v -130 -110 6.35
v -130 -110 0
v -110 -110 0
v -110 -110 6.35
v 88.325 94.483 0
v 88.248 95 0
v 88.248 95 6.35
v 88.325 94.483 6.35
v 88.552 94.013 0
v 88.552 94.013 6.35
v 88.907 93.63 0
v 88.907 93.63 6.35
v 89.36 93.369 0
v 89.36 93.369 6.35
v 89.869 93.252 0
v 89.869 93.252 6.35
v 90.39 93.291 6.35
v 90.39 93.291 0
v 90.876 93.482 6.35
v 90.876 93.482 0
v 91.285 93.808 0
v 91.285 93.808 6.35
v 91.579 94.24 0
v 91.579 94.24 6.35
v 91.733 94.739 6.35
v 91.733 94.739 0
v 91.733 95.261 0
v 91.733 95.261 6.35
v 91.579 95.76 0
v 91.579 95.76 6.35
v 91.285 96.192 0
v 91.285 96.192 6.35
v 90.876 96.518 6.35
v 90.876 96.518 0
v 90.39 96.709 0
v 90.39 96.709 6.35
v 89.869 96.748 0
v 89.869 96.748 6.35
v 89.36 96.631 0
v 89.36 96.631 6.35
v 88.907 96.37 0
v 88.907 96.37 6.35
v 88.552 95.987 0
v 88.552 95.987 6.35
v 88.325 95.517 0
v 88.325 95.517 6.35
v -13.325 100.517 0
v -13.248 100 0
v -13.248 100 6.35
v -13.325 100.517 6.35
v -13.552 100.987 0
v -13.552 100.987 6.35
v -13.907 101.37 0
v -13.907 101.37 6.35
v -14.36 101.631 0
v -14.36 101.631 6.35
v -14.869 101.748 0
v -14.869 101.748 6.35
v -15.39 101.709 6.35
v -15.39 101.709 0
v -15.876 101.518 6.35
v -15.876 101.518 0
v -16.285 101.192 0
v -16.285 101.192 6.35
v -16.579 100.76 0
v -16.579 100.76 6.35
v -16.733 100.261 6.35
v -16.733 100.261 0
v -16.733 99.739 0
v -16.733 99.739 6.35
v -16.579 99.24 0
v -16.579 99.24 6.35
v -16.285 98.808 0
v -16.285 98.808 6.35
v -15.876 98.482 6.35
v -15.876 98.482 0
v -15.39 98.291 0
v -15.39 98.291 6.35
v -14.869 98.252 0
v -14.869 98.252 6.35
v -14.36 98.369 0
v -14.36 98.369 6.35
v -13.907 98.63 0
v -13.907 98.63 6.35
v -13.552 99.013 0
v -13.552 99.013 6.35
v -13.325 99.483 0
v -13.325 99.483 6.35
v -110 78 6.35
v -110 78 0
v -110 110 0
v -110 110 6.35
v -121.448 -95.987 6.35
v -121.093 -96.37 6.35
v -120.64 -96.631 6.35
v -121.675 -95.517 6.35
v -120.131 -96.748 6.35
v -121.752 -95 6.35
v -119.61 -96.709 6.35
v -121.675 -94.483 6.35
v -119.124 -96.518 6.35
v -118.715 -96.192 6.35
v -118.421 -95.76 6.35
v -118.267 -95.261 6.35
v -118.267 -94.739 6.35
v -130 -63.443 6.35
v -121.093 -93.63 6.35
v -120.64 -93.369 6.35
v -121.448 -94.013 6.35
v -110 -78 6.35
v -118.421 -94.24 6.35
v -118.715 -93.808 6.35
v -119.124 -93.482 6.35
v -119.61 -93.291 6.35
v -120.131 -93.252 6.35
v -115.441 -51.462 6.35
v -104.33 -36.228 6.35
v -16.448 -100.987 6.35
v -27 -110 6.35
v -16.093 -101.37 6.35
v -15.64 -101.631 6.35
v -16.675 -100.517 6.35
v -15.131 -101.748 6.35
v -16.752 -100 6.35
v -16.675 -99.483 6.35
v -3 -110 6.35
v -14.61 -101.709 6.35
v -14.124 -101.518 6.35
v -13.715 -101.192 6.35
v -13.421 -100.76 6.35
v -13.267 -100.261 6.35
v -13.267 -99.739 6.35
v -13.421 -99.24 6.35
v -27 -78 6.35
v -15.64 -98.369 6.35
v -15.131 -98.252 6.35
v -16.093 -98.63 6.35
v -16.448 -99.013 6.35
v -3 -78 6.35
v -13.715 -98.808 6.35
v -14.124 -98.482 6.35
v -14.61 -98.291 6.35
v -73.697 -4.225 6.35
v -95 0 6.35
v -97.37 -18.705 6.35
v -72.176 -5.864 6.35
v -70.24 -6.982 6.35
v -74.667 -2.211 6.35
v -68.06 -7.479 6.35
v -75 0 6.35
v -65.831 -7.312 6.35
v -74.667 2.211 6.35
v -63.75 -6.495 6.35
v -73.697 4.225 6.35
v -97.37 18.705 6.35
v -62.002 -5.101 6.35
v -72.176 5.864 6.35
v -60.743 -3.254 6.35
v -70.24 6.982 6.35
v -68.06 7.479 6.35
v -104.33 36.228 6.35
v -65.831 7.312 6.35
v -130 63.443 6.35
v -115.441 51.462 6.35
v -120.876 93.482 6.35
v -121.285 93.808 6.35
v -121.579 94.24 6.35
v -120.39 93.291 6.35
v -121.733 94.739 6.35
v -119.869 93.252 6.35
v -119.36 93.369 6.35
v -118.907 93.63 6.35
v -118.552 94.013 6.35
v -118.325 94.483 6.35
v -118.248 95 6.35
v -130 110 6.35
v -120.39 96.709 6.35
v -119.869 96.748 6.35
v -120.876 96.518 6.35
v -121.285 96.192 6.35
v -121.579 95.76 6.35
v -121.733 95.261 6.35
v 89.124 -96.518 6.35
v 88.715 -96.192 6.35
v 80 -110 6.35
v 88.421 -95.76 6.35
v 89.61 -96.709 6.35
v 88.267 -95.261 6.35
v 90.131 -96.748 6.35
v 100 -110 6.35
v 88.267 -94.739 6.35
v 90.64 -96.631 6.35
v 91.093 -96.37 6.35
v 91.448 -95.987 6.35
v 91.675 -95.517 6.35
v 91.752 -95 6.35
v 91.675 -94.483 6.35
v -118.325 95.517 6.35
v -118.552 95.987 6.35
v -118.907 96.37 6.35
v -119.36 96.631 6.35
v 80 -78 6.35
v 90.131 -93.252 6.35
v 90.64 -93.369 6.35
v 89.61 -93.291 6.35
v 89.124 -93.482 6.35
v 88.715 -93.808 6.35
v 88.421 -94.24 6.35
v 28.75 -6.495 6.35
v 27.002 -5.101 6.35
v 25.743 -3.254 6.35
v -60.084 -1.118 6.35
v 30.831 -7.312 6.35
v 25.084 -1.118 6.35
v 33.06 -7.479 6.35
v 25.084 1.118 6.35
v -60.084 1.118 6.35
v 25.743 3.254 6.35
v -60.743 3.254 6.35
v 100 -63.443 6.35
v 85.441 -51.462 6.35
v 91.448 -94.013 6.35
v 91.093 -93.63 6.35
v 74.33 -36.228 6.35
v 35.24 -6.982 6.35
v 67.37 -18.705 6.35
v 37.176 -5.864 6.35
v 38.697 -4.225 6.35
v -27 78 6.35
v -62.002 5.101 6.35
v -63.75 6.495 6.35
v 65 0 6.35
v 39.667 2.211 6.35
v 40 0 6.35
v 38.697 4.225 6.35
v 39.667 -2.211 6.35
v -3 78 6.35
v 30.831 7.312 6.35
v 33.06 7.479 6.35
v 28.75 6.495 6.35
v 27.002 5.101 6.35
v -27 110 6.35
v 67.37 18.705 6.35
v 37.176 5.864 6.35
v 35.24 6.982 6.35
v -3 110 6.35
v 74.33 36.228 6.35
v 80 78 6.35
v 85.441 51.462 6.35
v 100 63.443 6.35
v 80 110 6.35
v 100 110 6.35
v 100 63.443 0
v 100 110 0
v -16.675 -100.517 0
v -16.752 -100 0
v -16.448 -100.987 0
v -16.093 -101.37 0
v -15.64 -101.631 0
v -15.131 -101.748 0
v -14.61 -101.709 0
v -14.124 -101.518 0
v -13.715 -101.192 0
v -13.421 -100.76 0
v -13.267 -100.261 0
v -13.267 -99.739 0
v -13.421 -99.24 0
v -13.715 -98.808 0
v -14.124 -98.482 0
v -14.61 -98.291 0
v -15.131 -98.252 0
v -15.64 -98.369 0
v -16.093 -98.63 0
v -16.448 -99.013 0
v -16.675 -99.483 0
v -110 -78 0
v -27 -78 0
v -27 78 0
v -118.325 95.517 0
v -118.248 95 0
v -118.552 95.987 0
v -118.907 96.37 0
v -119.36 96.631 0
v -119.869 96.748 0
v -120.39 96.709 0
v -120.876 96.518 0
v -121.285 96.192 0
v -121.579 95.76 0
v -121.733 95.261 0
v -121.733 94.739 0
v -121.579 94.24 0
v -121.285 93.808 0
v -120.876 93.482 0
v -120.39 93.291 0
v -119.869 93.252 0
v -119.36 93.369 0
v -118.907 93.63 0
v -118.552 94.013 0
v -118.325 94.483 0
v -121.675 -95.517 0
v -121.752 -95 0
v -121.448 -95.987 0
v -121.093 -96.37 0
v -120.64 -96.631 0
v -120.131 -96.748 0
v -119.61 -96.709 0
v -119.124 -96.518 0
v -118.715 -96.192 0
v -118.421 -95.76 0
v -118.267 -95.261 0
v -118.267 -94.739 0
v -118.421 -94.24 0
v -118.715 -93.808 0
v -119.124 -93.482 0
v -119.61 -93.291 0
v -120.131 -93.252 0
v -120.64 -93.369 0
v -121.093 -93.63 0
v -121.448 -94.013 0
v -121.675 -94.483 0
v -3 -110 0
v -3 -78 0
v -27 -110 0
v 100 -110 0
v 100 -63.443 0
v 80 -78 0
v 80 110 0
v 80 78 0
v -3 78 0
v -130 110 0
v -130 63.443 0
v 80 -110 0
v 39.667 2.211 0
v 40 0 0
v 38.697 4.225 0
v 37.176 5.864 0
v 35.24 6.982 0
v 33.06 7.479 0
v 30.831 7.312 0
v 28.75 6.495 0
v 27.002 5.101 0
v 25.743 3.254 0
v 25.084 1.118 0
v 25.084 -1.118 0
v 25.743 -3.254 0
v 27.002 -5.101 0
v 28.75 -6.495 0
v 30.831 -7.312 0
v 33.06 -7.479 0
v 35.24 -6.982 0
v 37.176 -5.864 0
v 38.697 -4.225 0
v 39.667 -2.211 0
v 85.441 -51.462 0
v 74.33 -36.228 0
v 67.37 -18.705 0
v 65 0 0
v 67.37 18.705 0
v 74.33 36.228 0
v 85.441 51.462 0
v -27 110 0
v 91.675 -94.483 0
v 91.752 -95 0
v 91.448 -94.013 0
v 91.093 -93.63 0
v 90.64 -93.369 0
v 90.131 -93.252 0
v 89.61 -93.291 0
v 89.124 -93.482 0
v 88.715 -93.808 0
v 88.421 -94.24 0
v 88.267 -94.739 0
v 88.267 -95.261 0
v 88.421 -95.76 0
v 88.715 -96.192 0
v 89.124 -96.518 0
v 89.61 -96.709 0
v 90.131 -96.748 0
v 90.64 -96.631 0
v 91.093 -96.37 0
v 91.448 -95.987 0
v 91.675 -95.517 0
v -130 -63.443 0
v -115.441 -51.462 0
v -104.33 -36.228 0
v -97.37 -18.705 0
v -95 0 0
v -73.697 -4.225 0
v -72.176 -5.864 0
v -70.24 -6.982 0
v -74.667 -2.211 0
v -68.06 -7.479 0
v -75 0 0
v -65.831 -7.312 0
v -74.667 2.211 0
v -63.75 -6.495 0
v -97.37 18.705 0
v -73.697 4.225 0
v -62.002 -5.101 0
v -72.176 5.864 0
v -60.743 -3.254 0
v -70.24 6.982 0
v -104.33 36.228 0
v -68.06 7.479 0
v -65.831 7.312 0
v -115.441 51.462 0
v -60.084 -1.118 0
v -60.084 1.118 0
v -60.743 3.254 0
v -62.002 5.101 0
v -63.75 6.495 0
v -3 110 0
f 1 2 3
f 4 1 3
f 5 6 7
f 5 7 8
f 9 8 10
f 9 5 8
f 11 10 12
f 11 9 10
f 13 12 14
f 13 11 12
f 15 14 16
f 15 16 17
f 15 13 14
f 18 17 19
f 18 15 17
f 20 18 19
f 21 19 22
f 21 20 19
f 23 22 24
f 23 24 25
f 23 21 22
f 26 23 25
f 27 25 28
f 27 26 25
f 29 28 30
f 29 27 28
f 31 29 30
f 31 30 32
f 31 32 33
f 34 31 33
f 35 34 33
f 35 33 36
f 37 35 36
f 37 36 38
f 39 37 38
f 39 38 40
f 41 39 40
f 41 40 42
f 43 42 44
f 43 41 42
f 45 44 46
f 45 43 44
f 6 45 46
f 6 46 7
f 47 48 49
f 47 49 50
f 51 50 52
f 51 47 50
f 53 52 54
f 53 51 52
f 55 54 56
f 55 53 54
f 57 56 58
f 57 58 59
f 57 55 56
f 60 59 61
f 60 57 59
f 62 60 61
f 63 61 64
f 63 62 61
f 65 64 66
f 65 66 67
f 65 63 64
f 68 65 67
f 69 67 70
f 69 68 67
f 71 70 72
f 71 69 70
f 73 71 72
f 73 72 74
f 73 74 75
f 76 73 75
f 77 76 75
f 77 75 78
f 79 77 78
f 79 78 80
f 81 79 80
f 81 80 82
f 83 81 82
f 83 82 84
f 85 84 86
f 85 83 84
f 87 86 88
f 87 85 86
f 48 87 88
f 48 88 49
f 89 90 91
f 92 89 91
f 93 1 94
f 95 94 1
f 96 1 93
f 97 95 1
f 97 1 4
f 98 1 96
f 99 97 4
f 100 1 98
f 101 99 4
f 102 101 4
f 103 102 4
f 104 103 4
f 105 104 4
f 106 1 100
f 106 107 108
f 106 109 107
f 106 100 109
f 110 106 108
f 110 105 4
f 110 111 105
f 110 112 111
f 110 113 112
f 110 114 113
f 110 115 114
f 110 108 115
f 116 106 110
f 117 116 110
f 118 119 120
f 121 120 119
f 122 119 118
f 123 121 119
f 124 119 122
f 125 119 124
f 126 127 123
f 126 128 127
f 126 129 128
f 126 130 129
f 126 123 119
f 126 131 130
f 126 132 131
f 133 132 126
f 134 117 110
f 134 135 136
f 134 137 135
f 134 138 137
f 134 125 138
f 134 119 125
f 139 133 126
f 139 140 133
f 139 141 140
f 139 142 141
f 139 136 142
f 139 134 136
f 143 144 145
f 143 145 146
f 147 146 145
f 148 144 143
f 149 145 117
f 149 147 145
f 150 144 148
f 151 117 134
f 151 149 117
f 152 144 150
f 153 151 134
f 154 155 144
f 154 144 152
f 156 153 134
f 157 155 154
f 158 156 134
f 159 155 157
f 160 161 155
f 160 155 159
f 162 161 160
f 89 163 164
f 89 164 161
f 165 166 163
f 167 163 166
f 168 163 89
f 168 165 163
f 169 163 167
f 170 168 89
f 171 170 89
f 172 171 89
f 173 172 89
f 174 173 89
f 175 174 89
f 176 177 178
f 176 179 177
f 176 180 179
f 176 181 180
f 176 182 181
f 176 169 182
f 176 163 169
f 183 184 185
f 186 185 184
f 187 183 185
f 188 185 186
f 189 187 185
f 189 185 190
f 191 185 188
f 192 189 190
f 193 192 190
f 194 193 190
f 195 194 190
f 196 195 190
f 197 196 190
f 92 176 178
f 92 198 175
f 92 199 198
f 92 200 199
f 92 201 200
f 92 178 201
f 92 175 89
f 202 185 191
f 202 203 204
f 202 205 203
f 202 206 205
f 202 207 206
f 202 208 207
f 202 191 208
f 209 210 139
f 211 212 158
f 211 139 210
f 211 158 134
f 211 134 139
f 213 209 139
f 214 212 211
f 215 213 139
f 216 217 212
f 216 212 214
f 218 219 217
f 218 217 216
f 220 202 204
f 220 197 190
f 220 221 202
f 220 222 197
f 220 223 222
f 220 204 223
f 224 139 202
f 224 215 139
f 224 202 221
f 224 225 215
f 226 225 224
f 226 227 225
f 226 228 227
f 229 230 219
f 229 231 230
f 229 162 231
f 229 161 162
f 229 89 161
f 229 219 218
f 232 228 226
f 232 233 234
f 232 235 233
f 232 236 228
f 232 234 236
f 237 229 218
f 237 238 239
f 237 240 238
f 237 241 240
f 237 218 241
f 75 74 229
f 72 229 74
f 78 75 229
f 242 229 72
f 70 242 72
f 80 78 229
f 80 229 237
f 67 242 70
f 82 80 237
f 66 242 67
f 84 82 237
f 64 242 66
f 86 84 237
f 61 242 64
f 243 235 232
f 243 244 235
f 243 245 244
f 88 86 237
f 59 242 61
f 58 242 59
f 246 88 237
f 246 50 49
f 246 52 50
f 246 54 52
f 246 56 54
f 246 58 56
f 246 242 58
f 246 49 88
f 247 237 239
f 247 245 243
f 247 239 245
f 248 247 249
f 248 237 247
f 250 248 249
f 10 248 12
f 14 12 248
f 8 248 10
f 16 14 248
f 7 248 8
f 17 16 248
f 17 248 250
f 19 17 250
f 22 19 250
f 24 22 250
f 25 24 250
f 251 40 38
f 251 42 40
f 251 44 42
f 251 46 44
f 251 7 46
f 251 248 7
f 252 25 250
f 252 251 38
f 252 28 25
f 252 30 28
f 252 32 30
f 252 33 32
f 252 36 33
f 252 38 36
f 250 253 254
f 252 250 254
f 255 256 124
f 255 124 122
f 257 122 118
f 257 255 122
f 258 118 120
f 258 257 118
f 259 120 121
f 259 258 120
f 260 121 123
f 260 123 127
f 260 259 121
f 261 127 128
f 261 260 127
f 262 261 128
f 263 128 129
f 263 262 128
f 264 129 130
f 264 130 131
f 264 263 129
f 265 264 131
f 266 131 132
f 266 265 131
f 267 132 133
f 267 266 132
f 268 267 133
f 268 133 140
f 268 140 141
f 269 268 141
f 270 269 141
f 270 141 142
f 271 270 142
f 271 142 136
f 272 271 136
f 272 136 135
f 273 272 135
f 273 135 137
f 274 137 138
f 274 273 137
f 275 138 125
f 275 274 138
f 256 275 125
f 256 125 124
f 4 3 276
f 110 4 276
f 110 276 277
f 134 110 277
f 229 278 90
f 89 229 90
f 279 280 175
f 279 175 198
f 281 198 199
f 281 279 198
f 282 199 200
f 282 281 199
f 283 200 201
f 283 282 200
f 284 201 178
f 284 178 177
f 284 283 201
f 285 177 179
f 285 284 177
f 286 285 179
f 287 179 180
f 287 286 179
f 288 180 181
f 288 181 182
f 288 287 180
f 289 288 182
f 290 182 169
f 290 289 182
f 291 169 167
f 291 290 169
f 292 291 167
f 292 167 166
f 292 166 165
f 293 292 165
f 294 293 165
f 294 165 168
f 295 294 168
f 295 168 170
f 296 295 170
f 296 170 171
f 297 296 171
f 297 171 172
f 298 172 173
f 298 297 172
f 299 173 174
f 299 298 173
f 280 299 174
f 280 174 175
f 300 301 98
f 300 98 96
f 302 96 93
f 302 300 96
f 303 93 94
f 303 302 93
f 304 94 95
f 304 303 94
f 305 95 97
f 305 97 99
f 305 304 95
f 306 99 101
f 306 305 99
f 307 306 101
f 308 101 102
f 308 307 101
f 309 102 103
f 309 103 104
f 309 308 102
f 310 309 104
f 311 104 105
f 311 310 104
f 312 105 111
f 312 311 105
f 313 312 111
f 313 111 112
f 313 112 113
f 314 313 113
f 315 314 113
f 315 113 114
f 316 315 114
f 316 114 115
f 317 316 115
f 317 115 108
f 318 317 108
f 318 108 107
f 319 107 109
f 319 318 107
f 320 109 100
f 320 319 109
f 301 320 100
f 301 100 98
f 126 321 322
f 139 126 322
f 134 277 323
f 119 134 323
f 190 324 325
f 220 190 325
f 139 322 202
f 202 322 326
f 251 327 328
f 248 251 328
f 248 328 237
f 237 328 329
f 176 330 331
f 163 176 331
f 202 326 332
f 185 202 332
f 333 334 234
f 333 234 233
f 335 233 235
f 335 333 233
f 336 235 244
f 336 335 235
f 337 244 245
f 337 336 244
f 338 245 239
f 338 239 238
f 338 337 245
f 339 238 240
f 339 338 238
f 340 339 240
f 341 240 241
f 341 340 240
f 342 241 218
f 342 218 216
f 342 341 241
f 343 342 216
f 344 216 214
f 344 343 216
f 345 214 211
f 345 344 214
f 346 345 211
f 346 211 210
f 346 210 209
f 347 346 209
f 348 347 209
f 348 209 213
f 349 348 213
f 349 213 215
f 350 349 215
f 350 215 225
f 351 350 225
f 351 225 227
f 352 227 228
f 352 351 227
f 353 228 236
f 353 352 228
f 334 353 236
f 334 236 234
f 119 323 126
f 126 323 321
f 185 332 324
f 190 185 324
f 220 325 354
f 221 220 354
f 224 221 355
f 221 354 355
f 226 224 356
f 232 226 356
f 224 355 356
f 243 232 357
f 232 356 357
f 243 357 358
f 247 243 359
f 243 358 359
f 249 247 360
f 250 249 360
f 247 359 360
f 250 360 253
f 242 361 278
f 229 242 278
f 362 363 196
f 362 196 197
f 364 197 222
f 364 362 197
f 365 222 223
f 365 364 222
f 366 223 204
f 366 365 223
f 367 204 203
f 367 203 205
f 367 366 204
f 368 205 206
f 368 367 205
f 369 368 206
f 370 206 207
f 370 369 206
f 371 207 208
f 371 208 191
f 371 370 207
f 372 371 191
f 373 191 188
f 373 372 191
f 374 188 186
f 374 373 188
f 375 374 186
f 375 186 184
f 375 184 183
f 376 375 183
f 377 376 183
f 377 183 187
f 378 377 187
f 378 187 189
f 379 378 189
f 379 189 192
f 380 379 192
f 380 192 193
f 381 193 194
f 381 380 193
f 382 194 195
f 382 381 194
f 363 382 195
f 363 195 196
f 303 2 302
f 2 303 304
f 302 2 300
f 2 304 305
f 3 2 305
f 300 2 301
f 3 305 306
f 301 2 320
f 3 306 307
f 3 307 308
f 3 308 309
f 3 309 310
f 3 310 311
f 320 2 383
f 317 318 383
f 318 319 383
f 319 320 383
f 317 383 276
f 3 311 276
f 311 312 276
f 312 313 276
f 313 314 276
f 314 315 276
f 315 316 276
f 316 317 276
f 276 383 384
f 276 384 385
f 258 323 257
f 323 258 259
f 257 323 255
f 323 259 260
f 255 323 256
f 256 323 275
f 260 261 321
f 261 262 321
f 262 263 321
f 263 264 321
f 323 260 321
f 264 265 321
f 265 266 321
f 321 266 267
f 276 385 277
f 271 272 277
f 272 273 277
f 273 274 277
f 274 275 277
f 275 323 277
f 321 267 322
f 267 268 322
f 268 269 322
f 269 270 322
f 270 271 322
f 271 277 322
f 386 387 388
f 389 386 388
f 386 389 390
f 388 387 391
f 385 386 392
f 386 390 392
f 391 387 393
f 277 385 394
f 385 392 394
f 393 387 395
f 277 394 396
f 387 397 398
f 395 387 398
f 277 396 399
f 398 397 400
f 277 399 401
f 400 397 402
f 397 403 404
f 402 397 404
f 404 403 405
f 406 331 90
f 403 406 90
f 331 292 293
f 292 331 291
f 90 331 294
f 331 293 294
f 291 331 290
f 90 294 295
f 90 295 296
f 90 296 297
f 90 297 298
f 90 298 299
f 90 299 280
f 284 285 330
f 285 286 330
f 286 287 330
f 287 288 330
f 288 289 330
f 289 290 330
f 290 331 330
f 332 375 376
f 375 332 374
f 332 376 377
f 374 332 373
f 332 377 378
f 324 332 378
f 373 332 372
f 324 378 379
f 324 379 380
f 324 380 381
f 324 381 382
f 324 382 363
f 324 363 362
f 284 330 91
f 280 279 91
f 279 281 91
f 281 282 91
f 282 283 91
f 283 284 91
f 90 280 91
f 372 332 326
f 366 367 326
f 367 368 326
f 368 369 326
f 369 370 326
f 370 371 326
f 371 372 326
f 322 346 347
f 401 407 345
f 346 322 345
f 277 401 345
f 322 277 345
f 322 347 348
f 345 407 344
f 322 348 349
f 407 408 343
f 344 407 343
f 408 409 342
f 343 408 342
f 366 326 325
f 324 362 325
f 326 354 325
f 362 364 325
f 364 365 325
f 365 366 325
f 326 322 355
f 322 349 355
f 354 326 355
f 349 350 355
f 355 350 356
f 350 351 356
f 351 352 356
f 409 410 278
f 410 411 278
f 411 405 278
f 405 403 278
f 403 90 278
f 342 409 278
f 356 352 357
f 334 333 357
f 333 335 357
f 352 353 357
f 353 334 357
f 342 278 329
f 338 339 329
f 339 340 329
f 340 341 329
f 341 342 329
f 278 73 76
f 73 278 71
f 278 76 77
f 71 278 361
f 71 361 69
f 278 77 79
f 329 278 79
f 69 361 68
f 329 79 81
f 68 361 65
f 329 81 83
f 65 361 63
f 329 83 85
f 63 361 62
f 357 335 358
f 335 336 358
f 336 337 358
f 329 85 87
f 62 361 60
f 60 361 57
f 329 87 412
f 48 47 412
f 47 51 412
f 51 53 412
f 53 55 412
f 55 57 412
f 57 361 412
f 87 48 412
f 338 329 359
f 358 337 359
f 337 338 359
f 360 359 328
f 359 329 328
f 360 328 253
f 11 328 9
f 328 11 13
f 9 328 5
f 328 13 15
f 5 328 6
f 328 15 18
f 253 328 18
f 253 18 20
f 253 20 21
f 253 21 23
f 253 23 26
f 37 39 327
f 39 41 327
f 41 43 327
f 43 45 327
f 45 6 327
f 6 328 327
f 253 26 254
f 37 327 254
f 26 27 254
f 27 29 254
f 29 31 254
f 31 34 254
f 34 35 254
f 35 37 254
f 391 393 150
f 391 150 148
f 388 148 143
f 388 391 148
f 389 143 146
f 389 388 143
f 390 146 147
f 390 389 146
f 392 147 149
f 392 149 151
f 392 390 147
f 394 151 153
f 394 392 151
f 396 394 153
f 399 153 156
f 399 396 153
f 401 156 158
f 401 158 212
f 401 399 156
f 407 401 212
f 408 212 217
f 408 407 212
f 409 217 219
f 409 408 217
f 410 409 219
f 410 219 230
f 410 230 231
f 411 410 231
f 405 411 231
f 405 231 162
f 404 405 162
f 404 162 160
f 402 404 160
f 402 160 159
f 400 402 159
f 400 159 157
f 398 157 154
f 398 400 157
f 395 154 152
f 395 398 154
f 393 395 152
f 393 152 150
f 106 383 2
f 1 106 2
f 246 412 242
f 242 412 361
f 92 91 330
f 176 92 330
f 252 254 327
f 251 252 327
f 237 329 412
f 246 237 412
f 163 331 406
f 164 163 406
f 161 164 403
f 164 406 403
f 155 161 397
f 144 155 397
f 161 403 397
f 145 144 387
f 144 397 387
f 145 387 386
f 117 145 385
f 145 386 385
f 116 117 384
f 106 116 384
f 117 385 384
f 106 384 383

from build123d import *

# Parameters (mm, degrees)
SKETCH1_R           = 7.5
SKETCH1_R_2         = 1.7525
BOSS_EXTRUDE1_DEPTH = 6.35


with BuildPart() as part:
    # Sketch1 → Boss-Extrude1 (new body)
    with BuildSketch(Plane.XY):
        with BuildLine():
            Line((100, 110), (80, 110))
            Line((80, 110), (80, 78))
            Line((80, 78), (-3, 78))
            Line((-3, 78), (-3, 110))
            Line((-3, 110), (-27, 110))
            Line((-27, 110), (-27, 78))
            Line((-27, 78), (-110, 78))
            Line((-110, 78), (-110, 110))
            Line((-110, 110), (-130, 110))
            Line((-130, 110), (-130, 63.442887702))
            ThreePointArc((-130, 63.442887702), (-95, 0), (-130, -63.442887702))
            Line((-130, -63.442887702), (-130, -110))
            Line((-130, -110), (-110, -110))
            Line((-110, -110), (-110, -78))
            Line((-110, -78), (-27, -78))
            Line((-27, -78), (-27, -110))
            Line((-27, -110), (-3, -110))
            Line((-3, -110), (-3, -78))
            Line((-3, -78), (80, -78))
            Line((80, -78), (80, -110))
            Line((80, -110), (100, -110))
            Line((100, -110), (100, -63.442887702))
            ThreePointArc((100, -63.442887702), (65, 0), (100, 63.442887702))
            Line((100, 63.442887702), (100, 110))
        make_face()
        with Locations((32.5, 0)):
            Circle(SKETCH1_R, mode=Mode.SUBTRACT)
        with Locations(Location((-67.5, 0, 0), (0, 0, 180))):
            Circle(SKETCH1_R, mode=Mode.SUBTRACT)
        with Locations((-120, 95)):
            Circle(SKETCH1_R_2, mode=Mode.SUBTRACT)
        with Locations(Location((90, 95, 0), (0, 0, 180))):
            Circle(SKETCH1_R_2, mode=Mode.SUBTRACT)
        with Locations((-15, 100)):
            Circle(SKETCH1_R_2, mode=Mode.SUBTRACT)
        with Locations(Location((-15, -100, 0), (0, 0, 180))):
            Circle(SKETCH1_R_2, mode=Mode.SUBTRACT)
        with Locations((90, -95)):
            Circle(SKETCH1_R_2, mode=Mode.SUBTRACT)
        with Locations(Location((-120, -95, 0), (0, 0, 180))):
            Circle(SKETCH1_R_2, mode=Mode.SUBTRACT)
    extrude(amount=BOSS_EXTRUDE1_DEPTH)


solid = part.part
